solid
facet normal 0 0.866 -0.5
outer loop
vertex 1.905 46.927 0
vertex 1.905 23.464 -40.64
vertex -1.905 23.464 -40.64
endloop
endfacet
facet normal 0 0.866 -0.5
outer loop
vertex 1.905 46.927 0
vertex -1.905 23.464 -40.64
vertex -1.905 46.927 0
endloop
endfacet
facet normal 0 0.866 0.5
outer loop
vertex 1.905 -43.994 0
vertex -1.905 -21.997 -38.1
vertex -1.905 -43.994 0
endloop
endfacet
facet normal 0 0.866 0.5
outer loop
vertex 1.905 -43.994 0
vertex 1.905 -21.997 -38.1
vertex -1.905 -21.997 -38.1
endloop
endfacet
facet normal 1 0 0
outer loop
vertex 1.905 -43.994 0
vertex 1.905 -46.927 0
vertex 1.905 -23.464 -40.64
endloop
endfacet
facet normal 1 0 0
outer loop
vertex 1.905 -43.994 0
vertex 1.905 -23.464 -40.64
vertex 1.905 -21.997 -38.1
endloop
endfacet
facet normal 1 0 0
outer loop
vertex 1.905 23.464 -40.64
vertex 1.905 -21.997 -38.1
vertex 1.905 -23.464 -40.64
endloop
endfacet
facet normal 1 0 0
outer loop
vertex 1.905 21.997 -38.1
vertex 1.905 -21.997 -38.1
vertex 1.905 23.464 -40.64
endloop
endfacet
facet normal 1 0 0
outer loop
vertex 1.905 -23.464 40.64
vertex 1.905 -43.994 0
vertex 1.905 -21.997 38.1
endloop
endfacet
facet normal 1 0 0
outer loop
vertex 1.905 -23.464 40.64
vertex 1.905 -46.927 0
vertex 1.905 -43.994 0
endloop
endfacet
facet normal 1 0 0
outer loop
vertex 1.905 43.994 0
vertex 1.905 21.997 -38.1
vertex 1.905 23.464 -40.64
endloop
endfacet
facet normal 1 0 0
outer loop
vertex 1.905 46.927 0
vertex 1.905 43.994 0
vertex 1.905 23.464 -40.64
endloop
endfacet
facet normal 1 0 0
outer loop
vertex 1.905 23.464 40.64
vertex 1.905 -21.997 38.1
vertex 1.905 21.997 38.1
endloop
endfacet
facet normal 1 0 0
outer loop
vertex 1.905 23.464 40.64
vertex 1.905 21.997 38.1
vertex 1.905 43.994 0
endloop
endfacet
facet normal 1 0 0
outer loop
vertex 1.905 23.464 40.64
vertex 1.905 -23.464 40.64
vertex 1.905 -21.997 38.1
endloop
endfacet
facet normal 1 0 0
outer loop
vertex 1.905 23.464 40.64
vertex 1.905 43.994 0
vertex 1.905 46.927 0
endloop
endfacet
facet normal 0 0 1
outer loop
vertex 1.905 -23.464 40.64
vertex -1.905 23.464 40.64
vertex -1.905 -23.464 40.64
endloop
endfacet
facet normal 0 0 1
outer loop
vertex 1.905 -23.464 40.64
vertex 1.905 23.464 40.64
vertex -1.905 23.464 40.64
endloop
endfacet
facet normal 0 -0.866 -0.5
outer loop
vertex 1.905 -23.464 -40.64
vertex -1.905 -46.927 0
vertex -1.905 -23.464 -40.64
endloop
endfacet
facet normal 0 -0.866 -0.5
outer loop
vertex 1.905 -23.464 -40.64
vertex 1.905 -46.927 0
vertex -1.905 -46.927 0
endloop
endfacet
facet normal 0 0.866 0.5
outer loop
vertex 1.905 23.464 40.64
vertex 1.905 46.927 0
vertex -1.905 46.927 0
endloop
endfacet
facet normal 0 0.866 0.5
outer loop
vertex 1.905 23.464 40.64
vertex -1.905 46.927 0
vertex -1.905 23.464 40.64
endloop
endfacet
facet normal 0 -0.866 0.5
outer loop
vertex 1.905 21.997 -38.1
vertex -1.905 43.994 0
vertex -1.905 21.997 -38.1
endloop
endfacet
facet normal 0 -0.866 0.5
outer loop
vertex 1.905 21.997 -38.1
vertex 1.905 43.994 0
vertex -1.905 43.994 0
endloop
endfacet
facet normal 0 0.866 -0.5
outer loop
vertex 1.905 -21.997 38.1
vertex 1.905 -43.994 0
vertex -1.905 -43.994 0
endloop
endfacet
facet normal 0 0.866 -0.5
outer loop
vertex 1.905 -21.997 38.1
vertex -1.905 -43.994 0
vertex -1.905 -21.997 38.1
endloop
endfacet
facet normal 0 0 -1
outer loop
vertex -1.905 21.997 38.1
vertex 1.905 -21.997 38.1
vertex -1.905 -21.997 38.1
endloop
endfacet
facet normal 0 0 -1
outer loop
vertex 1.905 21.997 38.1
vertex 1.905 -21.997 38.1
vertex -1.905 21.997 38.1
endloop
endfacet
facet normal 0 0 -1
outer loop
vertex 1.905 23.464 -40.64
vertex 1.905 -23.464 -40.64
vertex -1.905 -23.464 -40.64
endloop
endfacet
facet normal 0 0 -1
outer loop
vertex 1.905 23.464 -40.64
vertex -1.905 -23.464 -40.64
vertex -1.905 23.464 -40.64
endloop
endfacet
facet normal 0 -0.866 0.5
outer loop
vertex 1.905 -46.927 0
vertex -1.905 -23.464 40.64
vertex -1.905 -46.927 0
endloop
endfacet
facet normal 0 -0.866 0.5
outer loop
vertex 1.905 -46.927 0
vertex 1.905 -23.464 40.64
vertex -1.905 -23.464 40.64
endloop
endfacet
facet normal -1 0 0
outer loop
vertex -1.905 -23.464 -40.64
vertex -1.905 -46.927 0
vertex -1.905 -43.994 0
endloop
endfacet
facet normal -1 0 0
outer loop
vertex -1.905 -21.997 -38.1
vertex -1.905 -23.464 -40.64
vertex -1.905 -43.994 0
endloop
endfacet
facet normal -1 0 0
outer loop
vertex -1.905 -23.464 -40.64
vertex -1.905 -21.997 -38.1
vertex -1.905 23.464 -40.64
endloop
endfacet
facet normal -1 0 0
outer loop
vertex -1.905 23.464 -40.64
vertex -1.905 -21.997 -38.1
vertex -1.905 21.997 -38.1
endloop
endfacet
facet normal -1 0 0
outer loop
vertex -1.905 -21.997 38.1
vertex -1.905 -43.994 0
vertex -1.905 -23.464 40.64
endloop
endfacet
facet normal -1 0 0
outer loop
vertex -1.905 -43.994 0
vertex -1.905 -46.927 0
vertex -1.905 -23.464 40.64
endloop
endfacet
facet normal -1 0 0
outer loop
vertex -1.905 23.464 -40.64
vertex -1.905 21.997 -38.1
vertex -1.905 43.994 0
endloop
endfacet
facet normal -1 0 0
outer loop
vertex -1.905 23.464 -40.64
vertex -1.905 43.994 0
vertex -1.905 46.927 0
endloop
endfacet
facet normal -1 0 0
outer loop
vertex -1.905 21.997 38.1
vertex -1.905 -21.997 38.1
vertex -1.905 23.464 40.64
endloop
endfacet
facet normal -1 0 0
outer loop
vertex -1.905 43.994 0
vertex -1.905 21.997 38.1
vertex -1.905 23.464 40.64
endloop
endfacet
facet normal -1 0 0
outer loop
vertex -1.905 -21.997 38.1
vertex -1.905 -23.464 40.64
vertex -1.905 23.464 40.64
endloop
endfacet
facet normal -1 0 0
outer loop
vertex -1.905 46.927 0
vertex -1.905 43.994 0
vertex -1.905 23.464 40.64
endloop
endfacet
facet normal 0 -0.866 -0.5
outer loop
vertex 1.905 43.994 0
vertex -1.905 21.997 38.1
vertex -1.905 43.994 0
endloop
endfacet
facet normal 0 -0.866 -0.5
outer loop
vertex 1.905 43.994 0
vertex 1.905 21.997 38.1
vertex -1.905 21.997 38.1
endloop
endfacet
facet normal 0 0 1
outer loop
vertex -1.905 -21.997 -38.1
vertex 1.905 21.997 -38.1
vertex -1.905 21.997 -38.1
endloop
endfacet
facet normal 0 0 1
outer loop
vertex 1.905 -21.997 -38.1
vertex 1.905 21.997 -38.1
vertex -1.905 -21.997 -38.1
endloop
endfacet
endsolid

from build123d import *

# Parameters (mm, degrees)
F1_DEPTH = 1.905


with BuildPart() as f1:
    # F0 (on Right) → F1 (new body, symmetric)
    with BuildSketch(Plane.YZ):
        Polygon((-46.92703, 0), (-23.463515, -40.64), (23.463515, -40.64), (46.92703, 0), (23.463515, 40.64), (-23.463515, 40.64), align=None)
        Polygon((-43.994091, 0), (-21.997045, 38.1), (21.997045, 38.1), (43.994091, 0), (21.997045, -38.1), (-21.997045, -38.1), align=None, mode=Mode.SUBTRACT)
    extrude(amount=F1_DEPTH, both=True)


solid = f1.part
